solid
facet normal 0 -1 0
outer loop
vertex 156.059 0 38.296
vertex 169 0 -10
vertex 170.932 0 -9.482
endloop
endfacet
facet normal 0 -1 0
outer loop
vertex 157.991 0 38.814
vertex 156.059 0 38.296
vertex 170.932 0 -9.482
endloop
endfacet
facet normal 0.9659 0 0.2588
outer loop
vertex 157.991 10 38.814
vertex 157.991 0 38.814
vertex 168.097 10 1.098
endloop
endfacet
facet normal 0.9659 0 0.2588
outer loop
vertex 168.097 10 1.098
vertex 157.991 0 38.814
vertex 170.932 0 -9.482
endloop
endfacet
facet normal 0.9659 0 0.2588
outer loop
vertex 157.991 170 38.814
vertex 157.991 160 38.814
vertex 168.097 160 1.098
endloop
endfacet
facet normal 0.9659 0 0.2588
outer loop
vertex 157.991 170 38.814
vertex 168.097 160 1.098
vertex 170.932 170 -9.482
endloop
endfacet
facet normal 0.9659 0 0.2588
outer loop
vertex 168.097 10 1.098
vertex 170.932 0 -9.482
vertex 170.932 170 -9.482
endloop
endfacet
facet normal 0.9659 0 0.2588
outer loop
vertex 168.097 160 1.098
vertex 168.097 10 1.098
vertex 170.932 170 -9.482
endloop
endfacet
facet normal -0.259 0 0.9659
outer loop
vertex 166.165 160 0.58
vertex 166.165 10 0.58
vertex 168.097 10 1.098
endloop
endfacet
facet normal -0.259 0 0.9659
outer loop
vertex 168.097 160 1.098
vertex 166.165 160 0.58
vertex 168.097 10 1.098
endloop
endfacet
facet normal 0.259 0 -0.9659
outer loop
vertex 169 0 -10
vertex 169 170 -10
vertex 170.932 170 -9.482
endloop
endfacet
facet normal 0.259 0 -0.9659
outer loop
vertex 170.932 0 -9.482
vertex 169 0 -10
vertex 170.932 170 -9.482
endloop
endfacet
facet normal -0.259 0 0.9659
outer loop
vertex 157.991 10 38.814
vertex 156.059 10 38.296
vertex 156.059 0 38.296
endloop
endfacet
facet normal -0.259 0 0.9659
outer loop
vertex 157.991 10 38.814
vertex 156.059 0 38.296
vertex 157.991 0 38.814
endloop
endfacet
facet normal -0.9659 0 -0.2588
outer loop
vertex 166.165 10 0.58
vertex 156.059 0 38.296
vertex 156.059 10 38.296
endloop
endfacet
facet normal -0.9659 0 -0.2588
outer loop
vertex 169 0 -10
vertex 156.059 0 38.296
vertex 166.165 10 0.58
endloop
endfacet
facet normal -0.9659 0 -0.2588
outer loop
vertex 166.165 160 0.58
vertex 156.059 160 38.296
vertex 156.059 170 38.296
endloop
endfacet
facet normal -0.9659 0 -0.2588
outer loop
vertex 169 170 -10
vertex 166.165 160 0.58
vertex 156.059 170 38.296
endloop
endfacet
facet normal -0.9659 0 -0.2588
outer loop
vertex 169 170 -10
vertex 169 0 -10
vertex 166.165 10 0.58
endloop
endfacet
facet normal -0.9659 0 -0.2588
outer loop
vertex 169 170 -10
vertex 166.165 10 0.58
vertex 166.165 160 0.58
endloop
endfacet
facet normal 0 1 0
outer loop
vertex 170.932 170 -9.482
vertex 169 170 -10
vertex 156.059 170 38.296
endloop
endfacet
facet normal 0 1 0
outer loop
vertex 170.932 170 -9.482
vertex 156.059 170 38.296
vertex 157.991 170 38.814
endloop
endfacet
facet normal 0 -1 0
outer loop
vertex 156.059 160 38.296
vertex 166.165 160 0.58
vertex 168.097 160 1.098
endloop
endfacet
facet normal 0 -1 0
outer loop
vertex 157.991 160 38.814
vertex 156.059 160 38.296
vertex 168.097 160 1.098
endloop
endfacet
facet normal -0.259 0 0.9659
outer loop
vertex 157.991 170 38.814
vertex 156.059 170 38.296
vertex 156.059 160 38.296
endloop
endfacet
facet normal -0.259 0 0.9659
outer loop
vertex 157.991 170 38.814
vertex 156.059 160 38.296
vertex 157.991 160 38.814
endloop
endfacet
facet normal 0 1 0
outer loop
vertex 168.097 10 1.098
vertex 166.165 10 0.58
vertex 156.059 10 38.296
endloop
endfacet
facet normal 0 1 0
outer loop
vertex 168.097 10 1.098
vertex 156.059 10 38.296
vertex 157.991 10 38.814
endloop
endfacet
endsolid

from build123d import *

# Parameters (mm, degrees)
BOX020_W               = 24
BOX020_H               = 150
BOX020_DEPTH           = 40
BOX020_PLACEMENT_ANGLE = 15
BOX001_W               = 2
BOX001_H               = 170
BOX001_DEPTH           = 50
BOX001_PLACEMENT_ANGLE = 15


with BuildPart() as face001:
    # Box020 → Box020 (new body)
    with BuildSketch(Plane.XY):
        with Locations((12, 75)):
            Rectangle(BOX020_W, BOX020_H)
    extrude(amount=BOX020_DEPTH)


with BuildPart() as face001_1:
    # Box020 placement: moved
    add(face001.part.moved(Location((164, 10, 0))).rotate(Axis((164, 10, 0), (0, -1, 0)), BOX020_PLACEMENT_ANGLE))


with BuildPart() as cut005:
    # Box001 → Box001 (new body)
    with BuildSketch(Plane.XY):
        with Locations((1, 85)):
            Rectangle(BOX001_W, BOX001_H)
    extrude(amount=BOX001_DEPTH)


with BuildPart() as cut005_1:
    # Box001 placement: moved
    add(cut005.part.moved(Location((169, 0, -10))).rotate(Axis((169, 0, -10), (0, -1, 0)), BOX001_PLACEMENT_ANGLE))

    # Cut005: cut Face001
    add(face001_1.part, mode=Mode.SUBTRACT)


solid = cut005_1.part
